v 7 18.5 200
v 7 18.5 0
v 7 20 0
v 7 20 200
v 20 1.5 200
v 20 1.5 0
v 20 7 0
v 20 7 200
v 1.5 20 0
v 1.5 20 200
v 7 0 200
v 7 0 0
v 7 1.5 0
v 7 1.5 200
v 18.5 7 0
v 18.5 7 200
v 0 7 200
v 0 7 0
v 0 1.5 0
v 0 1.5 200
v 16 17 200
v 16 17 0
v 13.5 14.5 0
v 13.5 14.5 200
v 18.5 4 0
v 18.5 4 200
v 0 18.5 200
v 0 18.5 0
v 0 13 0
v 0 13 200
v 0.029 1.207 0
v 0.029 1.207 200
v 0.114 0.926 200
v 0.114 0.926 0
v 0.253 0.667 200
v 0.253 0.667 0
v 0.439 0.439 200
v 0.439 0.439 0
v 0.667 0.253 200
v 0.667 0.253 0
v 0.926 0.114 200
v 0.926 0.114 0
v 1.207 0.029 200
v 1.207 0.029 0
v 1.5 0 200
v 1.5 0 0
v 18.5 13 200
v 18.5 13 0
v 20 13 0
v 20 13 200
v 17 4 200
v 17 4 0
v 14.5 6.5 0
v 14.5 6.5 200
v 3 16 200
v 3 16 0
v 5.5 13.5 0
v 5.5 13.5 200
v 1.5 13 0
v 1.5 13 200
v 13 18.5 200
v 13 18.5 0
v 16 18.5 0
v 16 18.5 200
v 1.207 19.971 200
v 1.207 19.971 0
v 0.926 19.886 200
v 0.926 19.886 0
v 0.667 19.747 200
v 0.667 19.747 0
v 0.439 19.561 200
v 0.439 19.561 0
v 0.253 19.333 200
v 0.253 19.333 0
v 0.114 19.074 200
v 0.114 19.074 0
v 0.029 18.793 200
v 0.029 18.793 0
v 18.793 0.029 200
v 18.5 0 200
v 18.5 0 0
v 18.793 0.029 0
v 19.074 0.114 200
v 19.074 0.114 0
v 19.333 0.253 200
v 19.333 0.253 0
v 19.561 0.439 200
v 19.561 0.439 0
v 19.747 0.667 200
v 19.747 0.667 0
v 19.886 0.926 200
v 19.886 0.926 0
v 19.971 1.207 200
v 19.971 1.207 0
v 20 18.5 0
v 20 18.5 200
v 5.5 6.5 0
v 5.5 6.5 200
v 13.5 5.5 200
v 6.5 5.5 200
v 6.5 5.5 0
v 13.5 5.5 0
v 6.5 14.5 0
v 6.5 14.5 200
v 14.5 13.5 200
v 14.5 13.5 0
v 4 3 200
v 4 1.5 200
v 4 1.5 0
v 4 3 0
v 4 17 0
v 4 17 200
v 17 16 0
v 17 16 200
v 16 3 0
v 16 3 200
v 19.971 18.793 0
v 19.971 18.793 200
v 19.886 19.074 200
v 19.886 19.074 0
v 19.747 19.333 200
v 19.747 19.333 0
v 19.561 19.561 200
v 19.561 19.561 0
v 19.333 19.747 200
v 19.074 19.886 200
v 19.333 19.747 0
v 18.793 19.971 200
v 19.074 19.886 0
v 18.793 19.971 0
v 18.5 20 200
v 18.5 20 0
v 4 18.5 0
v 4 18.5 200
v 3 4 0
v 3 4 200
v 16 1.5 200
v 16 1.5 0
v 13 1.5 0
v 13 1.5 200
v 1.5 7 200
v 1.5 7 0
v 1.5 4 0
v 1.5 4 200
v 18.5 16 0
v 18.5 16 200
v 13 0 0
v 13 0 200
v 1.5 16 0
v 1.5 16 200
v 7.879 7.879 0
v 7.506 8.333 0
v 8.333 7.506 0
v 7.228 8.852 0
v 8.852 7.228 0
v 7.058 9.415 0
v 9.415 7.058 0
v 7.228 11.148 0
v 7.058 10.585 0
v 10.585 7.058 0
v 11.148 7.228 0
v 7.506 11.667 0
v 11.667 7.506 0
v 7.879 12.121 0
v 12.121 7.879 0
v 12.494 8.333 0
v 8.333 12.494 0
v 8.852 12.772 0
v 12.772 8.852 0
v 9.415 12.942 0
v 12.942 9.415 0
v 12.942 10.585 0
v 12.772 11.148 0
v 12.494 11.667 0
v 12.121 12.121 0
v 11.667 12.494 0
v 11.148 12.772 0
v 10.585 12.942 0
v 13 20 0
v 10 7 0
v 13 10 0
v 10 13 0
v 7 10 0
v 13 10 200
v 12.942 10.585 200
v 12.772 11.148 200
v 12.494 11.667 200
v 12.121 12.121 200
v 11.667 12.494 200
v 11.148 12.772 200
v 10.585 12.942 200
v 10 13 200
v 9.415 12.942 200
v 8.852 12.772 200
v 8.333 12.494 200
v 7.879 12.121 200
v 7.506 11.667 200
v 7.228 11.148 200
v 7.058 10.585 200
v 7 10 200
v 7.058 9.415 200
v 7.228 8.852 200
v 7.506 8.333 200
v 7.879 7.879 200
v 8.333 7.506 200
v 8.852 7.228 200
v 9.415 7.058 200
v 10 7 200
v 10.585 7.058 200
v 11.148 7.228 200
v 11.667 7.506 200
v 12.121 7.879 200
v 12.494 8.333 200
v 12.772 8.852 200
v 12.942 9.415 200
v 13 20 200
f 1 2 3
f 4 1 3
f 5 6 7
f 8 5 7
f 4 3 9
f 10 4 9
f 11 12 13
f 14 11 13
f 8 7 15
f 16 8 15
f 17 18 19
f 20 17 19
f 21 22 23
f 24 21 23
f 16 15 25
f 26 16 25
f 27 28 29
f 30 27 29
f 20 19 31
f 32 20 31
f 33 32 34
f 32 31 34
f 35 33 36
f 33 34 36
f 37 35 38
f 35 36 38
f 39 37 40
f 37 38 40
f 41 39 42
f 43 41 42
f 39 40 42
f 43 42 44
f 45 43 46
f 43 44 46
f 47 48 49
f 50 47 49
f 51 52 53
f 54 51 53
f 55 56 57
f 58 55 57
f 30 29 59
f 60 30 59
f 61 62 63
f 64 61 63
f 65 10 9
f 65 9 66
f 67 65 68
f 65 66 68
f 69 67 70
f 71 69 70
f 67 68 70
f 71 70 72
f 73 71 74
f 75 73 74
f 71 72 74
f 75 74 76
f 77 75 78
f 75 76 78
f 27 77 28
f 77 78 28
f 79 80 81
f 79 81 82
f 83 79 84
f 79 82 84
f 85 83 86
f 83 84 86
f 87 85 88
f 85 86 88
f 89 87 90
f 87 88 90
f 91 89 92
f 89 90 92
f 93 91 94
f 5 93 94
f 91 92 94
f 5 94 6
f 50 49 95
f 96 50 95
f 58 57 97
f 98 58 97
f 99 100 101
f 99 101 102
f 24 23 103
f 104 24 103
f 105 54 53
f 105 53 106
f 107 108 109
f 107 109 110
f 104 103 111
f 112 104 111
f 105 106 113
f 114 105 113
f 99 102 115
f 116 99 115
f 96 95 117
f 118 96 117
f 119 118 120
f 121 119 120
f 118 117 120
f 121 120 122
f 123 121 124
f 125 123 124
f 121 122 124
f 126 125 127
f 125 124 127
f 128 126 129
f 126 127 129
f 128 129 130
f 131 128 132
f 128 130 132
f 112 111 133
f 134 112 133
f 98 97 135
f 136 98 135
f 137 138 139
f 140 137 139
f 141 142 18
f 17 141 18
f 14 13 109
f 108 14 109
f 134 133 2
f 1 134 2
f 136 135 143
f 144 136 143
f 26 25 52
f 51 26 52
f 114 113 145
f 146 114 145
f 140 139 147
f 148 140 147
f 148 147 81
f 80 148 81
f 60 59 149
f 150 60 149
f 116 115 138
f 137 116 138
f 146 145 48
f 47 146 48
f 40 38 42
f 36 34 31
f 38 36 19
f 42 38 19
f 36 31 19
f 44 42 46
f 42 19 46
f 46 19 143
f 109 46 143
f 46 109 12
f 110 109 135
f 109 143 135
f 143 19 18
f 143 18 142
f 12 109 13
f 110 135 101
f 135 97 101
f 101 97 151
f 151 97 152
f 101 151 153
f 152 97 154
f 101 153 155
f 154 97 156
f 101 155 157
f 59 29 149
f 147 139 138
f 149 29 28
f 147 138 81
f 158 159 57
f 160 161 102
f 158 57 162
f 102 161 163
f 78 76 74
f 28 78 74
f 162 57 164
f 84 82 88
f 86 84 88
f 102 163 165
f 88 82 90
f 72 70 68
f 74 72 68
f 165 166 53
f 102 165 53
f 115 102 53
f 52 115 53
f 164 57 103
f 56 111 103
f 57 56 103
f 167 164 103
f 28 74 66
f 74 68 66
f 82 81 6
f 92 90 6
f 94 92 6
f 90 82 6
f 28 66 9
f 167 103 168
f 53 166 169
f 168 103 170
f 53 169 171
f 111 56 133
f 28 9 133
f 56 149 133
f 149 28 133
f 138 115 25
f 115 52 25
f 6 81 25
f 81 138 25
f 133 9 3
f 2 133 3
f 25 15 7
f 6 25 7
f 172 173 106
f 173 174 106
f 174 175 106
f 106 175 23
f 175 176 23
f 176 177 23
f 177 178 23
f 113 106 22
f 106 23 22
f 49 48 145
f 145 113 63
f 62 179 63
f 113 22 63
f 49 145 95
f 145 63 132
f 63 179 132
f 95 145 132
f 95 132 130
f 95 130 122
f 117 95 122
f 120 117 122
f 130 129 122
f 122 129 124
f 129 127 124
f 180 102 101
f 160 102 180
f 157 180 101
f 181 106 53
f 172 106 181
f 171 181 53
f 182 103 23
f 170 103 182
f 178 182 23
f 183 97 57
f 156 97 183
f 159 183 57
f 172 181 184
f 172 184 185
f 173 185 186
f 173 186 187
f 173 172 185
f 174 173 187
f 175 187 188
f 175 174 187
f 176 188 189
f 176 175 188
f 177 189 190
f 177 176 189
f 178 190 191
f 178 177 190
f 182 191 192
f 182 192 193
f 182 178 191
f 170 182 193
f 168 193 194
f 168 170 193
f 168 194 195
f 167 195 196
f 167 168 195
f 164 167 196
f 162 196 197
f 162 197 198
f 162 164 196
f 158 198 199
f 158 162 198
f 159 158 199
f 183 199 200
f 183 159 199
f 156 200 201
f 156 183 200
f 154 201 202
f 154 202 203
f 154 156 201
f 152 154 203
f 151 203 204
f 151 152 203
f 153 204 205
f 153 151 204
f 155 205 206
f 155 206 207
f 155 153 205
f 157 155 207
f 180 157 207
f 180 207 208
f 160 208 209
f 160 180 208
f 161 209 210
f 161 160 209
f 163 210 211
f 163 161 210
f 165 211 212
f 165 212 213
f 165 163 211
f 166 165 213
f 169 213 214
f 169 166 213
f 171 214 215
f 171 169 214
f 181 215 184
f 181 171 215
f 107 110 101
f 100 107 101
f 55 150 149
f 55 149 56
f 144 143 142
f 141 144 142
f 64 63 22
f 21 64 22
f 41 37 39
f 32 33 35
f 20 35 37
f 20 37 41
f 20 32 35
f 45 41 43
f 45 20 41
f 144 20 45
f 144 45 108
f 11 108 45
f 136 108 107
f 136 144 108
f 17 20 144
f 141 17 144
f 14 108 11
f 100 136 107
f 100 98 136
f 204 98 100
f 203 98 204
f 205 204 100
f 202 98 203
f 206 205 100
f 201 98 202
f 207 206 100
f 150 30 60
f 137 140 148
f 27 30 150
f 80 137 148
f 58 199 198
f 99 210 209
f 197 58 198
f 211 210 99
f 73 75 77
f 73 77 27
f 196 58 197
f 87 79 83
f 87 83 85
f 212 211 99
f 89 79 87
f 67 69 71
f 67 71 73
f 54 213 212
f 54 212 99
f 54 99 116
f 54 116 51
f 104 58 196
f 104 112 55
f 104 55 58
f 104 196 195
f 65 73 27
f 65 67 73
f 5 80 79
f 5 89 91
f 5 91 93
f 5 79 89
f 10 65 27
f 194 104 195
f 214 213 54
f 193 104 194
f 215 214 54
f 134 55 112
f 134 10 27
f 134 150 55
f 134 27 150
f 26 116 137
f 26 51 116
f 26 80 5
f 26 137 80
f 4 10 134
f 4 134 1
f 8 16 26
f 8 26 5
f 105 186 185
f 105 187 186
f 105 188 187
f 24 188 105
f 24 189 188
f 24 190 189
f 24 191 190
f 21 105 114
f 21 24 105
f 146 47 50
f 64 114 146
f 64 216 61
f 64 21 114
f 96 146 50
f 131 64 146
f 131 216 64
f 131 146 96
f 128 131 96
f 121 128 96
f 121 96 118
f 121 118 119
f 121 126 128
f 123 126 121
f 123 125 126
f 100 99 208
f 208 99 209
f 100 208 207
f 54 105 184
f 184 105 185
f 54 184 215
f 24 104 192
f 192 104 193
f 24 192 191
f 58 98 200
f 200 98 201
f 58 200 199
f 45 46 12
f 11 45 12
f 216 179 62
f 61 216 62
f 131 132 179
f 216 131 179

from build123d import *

# Parameters (mm, degrees)
F0_R     = 3
F1_DEPTH = 200


with BuildPart() as f1:
    # F0 (on Top) → F1 (new body)
    with BuildSketch(Plane.XY):
        with BuildLine():
            ThreePointArc((0, 1.5), (0.43934, 0.43934), (1.5, 0))
            Line((1.5, 0), (7, 0))
            Line((7, 0), (7, 1.5))
            Line((7, 1.5), (4, 1.5))
            Line((4, 1.5), (4, 3))
            Line((4, 3), (6.5, 5.5))
            Line((6.5, 5.5), (10, 5.5))
            Line((10, 5.5), (13.5, 5.5))
            Line((13.5, 5.5), (16, 3))
            Line((16, 3), (16, 1.5))
            Line((16, 1.5), (13, 1.5))
            Line((13, 1.5), (13, 0))
            Line((13, 0), (18.5, 0))
            ThreePointArc((18.5, 0), (19.56066, 0.43934), (20, 1.5))
            Line((20, 1.5), (20, 7))
            Line((20, 7), (18.5, 7))
            Line((18.5, 7), (18.5, 4))
            Line((18.5, 4), (17, 4))
            Line((17, 4), (14.5, 6.5))
            Line((14.5, 6.5), (14.5, 10))
            Line((14.5, 10), (14.5, 13.5))
            Line((14.5, 13.5), (17, 16))
            Line((17, 16), (18.5, 16))
            Line((18.5, 16), (18.5, 13))
            Line((18.5, 13), (20, 13))
            Line((20, 13), (20, 18.5))
            ThreePointArc((20, 18.5), (19.56066, 19.56066), (18.5, 20))
            Line((18.5, 20), (13, 20))
            Line((13, 20), (13, 18.5))
            Line((13, 18.5), (16, 18.5))
            Line((16, 18.5), (16, 17))
            Line((16, 17), (13.5, 14.5))
            Line((13.5, 14.5), (10, 14.5))
            Line((10, 14.5), (6.5, 14.5))
            Line((6.5, 14.5), (4, 17))
            Line((4, 17), (4, 18.5))
            Line((4, 18.5), (7, 18.5))
            Line((7, 18.5), (7, 20))
            Line((7, 20), (1.5, 20))
            ThreePointArc((1.5, 20), (0.43934, 19.56066), (0, 18.5))
            Line((0, 18.5), (0, 13))
            Line((0, 13), (1.5, 13))
            Line((1.5, 13), (1.5, 16))
            Line((1.5, 16), (3, 16))
            Line((3, 16), (5.5, 13.5))
            Line((5.5, 13.5), (5.5, 10))
            Line((5.5, 10), (5.5, 6.5))
            Line((5.5, 6.5), (3, 4))
            Line((3, 4), (1.5, 4))
            Line((1.5, 4), (1.5, 7))
            Line((1.5, 7), (0, 7))
            Line((0, 7), (0, 1.5))
        make_face()
        with Locations((10, 10)):
            Circle(F0_R, mode=Mode.SUBTRACT)
    extrude(amount=F1_DEPTH)


solid = f1.part
